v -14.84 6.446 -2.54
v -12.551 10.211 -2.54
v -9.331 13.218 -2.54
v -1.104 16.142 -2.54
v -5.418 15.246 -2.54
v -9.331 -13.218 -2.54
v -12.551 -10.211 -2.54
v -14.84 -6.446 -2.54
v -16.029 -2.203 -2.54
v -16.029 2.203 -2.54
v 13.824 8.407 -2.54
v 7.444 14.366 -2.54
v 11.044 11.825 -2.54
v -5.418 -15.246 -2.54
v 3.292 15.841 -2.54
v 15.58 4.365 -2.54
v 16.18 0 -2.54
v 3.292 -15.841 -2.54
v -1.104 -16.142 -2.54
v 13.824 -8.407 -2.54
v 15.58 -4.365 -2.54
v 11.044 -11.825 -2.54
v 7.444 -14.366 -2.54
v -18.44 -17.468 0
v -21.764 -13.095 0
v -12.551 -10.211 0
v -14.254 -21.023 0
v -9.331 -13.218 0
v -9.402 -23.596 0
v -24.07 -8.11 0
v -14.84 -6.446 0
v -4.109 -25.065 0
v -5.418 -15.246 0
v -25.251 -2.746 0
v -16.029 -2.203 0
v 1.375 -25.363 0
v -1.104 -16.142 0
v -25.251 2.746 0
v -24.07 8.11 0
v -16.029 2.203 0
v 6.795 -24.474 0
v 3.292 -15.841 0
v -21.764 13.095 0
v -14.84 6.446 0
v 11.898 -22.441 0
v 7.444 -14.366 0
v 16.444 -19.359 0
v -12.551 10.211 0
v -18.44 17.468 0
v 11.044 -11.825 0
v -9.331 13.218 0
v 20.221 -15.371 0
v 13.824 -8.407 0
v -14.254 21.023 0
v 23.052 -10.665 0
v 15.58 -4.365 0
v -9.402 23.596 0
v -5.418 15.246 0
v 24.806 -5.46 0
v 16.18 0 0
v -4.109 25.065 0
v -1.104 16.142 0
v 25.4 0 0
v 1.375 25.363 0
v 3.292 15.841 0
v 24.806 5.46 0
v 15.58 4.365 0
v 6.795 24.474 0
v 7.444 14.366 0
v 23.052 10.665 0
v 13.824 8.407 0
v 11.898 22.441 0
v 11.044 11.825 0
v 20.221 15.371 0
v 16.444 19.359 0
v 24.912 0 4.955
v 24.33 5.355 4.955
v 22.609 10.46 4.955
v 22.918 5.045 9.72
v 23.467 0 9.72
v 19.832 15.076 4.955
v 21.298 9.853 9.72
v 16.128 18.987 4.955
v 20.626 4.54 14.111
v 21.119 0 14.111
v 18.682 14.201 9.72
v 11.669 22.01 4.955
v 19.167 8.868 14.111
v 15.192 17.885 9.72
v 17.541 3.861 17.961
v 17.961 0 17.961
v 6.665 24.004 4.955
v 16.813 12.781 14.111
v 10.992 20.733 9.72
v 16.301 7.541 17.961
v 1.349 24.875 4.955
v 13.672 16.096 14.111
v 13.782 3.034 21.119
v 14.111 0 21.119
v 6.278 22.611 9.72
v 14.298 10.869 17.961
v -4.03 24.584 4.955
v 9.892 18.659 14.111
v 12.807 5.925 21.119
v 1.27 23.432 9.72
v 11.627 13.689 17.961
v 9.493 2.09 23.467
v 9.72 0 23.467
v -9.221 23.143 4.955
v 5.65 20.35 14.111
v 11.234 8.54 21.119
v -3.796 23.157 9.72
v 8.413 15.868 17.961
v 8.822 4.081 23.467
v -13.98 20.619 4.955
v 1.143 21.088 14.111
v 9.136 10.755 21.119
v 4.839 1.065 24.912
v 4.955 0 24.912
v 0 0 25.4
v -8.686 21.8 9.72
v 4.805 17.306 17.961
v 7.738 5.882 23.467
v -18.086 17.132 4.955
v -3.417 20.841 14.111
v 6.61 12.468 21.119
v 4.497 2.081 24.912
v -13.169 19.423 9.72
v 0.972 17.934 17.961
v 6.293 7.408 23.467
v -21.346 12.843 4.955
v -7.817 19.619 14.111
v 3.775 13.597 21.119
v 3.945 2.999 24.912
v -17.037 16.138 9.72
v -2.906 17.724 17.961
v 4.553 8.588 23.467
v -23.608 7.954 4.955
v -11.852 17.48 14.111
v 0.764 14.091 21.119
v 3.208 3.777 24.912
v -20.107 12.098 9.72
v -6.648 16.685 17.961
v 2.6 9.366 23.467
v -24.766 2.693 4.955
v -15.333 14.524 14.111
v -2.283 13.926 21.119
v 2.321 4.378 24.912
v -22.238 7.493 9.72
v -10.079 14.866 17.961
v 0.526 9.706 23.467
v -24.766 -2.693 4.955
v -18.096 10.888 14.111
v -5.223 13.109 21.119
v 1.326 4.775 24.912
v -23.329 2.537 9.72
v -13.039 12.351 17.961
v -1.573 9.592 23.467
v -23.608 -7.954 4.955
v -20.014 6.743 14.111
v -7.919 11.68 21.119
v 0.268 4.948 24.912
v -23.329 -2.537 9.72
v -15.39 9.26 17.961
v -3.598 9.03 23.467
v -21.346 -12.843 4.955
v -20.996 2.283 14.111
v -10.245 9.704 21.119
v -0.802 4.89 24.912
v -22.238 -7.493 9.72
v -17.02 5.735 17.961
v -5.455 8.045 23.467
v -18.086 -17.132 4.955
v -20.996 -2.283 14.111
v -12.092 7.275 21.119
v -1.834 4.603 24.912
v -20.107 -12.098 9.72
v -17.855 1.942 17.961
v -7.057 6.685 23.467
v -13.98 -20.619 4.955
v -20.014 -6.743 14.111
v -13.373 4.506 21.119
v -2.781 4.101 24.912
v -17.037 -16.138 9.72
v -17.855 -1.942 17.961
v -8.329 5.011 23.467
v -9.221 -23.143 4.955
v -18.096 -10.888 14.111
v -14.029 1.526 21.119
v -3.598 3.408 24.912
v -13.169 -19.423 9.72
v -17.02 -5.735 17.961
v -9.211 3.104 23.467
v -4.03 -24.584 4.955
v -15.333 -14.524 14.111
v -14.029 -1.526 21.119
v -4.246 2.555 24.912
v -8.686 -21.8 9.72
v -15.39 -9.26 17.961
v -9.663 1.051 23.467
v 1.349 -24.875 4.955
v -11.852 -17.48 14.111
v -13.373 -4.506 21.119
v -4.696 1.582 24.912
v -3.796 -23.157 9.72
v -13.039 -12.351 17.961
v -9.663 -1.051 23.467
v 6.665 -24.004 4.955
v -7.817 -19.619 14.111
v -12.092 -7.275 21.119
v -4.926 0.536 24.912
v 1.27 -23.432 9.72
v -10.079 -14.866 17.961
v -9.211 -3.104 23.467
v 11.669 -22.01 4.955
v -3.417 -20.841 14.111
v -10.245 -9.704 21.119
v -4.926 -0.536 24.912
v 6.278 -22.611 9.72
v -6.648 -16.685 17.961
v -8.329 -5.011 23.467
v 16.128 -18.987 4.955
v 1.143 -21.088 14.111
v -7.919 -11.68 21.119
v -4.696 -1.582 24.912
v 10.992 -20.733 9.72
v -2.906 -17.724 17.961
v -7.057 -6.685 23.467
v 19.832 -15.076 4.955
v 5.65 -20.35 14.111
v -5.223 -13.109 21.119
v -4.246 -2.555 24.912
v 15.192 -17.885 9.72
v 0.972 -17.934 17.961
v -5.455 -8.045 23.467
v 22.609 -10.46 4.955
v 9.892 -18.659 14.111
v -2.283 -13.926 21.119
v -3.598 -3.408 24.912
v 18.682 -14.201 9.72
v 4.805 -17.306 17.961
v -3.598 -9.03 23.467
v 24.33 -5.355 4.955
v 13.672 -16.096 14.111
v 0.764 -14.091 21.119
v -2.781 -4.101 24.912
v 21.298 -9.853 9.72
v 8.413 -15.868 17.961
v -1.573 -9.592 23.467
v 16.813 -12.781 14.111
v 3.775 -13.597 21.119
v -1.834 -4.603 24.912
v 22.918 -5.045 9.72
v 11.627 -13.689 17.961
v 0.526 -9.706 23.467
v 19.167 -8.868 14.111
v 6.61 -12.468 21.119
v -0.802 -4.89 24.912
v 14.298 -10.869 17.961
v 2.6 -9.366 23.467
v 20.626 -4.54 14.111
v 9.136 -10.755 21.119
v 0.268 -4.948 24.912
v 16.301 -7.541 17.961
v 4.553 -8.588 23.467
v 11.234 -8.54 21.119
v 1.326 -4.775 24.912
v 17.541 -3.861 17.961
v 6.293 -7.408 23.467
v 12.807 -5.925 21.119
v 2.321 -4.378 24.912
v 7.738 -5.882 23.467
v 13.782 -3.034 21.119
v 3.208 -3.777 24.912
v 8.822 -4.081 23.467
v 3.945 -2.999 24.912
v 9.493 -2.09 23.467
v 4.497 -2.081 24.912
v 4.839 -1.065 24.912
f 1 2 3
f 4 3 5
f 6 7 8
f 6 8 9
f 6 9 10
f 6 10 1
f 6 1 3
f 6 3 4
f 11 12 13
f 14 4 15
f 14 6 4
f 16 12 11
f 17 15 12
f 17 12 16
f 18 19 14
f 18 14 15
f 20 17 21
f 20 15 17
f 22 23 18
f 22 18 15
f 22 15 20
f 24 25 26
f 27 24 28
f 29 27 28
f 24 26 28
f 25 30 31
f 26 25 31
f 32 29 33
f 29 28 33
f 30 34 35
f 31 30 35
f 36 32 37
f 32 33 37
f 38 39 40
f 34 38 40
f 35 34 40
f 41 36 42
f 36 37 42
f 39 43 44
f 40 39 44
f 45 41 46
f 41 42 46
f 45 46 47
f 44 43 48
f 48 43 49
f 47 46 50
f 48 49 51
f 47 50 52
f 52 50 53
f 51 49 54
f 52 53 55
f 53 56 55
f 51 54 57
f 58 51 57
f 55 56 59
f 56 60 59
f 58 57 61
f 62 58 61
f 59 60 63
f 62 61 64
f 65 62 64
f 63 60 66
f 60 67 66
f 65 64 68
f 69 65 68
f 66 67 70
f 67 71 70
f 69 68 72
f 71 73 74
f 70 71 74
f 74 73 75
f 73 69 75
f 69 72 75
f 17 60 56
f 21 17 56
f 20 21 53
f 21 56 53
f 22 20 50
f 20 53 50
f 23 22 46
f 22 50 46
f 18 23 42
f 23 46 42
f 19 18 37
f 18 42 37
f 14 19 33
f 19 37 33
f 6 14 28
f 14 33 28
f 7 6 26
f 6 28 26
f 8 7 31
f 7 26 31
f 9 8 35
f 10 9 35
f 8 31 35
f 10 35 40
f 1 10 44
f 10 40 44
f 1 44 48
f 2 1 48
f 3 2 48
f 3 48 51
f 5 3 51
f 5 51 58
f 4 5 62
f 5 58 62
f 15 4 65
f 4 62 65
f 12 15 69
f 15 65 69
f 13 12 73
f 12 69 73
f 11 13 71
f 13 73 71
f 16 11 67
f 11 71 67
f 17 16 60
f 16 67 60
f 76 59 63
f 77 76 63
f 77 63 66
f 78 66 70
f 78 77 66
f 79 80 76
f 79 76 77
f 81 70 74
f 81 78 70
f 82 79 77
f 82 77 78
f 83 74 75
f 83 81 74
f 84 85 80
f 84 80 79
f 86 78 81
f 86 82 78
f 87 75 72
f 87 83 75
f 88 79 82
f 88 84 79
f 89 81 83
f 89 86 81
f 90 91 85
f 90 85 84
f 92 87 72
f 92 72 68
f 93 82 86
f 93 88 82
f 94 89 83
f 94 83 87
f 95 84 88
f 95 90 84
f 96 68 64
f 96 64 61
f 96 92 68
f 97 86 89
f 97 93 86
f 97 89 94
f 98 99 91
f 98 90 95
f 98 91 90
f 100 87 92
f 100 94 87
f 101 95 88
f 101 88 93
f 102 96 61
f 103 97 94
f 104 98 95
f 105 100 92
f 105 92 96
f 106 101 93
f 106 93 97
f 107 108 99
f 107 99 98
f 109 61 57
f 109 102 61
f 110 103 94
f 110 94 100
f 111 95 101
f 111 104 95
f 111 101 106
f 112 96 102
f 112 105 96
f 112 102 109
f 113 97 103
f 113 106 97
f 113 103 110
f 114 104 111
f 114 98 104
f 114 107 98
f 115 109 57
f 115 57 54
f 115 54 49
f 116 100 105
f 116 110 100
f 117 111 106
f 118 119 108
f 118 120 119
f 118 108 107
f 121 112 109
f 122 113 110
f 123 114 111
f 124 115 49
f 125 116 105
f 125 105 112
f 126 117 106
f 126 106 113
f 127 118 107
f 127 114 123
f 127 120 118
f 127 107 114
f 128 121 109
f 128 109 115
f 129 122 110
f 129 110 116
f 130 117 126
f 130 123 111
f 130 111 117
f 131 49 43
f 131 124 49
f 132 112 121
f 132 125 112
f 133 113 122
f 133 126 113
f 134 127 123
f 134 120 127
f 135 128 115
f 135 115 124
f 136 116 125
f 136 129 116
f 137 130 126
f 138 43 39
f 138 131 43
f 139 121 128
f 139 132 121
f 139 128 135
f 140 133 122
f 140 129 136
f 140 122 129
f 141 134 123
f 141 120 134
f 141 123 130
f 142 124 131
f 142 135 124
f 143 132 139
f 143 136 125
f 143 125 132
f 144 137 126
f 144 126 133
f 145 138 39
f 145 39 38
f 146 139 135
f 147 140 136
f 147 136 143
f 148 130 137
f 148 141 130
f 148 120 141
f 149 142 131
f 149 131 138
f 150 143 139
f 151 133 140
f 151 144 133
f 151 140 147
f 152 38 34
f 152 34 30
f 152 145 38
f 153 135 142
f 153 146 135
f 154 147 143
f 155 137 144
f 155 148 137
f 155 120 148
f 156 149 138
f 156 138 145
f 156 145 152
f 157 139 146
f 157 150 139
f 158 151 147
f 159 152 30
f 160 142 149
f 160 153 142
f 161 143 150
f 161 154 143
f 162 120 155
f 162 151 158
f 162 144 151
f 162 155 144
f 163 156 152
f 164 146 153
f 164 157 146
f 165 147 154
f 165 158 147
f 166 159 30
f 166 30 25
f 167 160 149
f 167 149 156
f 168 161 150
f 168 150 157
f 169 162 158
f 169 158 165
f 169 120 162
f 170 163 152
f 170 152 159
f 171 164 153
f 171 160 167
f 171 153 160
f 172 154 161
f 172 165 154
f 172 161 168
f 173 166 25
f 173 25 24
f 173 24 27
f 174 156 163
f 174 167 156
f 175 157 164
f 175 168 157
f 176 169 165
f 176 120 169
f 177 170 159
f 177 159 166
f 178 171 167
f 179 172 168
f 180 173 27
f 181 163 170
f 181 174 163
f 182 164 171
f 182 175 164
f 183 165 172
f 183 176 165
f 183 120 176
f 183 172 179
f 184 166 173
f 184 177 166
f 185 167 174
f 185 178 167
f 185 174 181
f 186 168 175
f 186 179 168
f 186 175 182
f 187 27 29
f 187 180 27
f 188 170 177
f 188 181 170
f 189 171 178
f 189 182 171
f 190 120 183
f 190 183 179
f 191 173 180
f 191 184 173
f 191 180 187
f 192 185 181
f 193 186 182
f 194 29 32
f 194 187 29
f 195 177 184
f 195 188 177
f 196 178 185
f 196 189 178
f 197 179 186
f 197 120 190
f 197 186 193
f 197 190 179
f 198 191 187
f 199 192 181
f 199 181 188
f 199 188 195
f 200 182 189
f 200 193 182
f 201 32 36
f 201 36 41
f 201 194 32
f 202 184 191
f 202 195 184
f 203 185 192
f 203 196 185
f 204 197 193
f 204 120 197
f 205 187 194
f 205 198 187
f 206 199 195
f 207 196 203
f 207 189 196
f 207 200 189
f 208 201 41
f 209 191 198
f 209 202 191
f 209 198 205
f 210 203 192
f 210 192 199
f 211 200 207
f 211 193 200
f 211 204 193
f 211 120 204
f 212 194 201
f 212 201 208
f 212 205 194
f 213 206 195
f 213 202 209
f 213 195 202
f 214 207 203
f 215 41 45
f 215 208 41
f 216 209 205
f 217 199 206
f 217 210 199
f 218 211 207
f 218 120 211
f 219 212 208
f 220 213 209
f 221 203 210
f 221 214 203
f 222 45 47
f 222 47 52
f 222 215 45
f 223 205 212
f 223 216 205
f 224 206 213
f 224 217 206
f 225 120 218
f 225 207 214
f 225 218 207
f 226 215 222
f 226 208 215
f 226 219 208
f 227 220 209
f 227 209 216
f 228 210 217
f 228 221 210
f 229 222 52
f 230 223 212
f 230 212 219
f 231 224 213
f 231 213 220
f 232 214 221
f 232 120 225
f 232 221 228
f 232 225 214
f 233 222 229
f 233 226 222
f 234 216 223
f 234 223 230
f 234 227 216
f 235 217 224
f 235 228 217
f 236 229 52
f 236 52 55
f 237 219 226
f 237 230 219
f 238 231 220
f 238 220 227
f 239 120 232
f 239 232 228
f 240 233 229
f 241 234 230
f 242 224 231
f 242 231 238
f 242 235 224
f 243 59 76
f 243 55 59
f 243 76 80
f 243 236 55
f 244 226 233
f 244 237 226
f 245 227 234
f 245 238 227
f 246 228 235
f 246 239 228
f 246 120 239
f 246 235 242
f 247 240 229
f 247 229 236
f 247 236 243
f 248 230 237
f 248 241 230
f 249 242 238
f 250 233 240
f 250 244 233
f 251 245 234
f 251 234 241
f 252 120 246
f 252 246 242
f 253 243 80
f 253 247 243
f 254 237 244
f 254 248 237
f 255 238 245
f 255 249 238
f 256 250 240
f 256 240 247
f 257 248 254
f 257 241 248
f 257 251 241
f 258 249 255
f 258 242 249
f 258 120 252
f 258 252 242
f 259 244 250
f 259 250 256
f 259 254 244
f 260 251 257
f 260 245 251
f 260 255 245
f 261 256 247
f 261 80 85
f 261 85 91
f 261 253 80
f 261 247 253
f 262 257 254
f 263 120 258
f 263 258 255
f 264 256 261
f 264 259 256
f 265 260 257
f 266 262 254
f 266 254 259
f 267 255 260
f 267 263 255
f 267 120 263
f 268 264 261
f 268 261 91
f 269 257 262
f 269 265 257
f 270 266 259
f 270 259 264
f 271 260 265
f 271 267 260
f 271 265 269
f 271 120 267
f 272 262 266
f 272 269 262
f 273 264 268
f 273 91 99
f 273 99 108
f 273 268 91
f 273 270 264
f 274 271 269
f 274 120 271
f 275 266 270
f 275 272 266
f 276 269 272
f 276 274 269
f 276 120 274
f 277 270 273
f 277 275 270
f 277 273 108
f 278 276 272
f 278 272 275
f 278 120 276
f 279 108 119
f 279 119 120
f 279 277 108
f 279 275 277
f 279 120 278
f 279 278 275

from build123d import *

# Parameters (mm, degrees)
F1_R     = 25.4
F2_DEPTH = 25.4
F3_R     = 25.39999
F4_R     = 16.1798
F5_DEPTH = 2.54


# Not quite as in the source:
# - a variable given as a bare number and used for a length is read in inches; the dataset says mm whatever the document's units were
# - a fillet or chamfer is up to 0.001 mm smaller than in the source, because OpenCascade refuses the exact size


with BuildPart() as f2:
    # F1 (on Top) → F2 (new body)
    with BuildSketch(Plane.XY):
        Circle(F1_R)
    extrude(amount=F2_DEPTH)

    # F3 (radius 25.4 in the source; OpenCascade refuses exactly that, so slightly less here)
    f3_edges = [f2.edges().sort_by_distance(p)[0] for p in [
        (-25.4, 0, 25.4),
    ]]
    fillet(f3_edges, radius=F3_R)

    # F4 (on face) → F5 (join)
    with BuildSketch(Plane(origin=(0, 0, 0), x_dir=(1, 0, 0), z_dir=(0, 0, -1))):
        Circle(F4_R)
    extrude(amount=F5_DEPTH)


solid = f2.part
